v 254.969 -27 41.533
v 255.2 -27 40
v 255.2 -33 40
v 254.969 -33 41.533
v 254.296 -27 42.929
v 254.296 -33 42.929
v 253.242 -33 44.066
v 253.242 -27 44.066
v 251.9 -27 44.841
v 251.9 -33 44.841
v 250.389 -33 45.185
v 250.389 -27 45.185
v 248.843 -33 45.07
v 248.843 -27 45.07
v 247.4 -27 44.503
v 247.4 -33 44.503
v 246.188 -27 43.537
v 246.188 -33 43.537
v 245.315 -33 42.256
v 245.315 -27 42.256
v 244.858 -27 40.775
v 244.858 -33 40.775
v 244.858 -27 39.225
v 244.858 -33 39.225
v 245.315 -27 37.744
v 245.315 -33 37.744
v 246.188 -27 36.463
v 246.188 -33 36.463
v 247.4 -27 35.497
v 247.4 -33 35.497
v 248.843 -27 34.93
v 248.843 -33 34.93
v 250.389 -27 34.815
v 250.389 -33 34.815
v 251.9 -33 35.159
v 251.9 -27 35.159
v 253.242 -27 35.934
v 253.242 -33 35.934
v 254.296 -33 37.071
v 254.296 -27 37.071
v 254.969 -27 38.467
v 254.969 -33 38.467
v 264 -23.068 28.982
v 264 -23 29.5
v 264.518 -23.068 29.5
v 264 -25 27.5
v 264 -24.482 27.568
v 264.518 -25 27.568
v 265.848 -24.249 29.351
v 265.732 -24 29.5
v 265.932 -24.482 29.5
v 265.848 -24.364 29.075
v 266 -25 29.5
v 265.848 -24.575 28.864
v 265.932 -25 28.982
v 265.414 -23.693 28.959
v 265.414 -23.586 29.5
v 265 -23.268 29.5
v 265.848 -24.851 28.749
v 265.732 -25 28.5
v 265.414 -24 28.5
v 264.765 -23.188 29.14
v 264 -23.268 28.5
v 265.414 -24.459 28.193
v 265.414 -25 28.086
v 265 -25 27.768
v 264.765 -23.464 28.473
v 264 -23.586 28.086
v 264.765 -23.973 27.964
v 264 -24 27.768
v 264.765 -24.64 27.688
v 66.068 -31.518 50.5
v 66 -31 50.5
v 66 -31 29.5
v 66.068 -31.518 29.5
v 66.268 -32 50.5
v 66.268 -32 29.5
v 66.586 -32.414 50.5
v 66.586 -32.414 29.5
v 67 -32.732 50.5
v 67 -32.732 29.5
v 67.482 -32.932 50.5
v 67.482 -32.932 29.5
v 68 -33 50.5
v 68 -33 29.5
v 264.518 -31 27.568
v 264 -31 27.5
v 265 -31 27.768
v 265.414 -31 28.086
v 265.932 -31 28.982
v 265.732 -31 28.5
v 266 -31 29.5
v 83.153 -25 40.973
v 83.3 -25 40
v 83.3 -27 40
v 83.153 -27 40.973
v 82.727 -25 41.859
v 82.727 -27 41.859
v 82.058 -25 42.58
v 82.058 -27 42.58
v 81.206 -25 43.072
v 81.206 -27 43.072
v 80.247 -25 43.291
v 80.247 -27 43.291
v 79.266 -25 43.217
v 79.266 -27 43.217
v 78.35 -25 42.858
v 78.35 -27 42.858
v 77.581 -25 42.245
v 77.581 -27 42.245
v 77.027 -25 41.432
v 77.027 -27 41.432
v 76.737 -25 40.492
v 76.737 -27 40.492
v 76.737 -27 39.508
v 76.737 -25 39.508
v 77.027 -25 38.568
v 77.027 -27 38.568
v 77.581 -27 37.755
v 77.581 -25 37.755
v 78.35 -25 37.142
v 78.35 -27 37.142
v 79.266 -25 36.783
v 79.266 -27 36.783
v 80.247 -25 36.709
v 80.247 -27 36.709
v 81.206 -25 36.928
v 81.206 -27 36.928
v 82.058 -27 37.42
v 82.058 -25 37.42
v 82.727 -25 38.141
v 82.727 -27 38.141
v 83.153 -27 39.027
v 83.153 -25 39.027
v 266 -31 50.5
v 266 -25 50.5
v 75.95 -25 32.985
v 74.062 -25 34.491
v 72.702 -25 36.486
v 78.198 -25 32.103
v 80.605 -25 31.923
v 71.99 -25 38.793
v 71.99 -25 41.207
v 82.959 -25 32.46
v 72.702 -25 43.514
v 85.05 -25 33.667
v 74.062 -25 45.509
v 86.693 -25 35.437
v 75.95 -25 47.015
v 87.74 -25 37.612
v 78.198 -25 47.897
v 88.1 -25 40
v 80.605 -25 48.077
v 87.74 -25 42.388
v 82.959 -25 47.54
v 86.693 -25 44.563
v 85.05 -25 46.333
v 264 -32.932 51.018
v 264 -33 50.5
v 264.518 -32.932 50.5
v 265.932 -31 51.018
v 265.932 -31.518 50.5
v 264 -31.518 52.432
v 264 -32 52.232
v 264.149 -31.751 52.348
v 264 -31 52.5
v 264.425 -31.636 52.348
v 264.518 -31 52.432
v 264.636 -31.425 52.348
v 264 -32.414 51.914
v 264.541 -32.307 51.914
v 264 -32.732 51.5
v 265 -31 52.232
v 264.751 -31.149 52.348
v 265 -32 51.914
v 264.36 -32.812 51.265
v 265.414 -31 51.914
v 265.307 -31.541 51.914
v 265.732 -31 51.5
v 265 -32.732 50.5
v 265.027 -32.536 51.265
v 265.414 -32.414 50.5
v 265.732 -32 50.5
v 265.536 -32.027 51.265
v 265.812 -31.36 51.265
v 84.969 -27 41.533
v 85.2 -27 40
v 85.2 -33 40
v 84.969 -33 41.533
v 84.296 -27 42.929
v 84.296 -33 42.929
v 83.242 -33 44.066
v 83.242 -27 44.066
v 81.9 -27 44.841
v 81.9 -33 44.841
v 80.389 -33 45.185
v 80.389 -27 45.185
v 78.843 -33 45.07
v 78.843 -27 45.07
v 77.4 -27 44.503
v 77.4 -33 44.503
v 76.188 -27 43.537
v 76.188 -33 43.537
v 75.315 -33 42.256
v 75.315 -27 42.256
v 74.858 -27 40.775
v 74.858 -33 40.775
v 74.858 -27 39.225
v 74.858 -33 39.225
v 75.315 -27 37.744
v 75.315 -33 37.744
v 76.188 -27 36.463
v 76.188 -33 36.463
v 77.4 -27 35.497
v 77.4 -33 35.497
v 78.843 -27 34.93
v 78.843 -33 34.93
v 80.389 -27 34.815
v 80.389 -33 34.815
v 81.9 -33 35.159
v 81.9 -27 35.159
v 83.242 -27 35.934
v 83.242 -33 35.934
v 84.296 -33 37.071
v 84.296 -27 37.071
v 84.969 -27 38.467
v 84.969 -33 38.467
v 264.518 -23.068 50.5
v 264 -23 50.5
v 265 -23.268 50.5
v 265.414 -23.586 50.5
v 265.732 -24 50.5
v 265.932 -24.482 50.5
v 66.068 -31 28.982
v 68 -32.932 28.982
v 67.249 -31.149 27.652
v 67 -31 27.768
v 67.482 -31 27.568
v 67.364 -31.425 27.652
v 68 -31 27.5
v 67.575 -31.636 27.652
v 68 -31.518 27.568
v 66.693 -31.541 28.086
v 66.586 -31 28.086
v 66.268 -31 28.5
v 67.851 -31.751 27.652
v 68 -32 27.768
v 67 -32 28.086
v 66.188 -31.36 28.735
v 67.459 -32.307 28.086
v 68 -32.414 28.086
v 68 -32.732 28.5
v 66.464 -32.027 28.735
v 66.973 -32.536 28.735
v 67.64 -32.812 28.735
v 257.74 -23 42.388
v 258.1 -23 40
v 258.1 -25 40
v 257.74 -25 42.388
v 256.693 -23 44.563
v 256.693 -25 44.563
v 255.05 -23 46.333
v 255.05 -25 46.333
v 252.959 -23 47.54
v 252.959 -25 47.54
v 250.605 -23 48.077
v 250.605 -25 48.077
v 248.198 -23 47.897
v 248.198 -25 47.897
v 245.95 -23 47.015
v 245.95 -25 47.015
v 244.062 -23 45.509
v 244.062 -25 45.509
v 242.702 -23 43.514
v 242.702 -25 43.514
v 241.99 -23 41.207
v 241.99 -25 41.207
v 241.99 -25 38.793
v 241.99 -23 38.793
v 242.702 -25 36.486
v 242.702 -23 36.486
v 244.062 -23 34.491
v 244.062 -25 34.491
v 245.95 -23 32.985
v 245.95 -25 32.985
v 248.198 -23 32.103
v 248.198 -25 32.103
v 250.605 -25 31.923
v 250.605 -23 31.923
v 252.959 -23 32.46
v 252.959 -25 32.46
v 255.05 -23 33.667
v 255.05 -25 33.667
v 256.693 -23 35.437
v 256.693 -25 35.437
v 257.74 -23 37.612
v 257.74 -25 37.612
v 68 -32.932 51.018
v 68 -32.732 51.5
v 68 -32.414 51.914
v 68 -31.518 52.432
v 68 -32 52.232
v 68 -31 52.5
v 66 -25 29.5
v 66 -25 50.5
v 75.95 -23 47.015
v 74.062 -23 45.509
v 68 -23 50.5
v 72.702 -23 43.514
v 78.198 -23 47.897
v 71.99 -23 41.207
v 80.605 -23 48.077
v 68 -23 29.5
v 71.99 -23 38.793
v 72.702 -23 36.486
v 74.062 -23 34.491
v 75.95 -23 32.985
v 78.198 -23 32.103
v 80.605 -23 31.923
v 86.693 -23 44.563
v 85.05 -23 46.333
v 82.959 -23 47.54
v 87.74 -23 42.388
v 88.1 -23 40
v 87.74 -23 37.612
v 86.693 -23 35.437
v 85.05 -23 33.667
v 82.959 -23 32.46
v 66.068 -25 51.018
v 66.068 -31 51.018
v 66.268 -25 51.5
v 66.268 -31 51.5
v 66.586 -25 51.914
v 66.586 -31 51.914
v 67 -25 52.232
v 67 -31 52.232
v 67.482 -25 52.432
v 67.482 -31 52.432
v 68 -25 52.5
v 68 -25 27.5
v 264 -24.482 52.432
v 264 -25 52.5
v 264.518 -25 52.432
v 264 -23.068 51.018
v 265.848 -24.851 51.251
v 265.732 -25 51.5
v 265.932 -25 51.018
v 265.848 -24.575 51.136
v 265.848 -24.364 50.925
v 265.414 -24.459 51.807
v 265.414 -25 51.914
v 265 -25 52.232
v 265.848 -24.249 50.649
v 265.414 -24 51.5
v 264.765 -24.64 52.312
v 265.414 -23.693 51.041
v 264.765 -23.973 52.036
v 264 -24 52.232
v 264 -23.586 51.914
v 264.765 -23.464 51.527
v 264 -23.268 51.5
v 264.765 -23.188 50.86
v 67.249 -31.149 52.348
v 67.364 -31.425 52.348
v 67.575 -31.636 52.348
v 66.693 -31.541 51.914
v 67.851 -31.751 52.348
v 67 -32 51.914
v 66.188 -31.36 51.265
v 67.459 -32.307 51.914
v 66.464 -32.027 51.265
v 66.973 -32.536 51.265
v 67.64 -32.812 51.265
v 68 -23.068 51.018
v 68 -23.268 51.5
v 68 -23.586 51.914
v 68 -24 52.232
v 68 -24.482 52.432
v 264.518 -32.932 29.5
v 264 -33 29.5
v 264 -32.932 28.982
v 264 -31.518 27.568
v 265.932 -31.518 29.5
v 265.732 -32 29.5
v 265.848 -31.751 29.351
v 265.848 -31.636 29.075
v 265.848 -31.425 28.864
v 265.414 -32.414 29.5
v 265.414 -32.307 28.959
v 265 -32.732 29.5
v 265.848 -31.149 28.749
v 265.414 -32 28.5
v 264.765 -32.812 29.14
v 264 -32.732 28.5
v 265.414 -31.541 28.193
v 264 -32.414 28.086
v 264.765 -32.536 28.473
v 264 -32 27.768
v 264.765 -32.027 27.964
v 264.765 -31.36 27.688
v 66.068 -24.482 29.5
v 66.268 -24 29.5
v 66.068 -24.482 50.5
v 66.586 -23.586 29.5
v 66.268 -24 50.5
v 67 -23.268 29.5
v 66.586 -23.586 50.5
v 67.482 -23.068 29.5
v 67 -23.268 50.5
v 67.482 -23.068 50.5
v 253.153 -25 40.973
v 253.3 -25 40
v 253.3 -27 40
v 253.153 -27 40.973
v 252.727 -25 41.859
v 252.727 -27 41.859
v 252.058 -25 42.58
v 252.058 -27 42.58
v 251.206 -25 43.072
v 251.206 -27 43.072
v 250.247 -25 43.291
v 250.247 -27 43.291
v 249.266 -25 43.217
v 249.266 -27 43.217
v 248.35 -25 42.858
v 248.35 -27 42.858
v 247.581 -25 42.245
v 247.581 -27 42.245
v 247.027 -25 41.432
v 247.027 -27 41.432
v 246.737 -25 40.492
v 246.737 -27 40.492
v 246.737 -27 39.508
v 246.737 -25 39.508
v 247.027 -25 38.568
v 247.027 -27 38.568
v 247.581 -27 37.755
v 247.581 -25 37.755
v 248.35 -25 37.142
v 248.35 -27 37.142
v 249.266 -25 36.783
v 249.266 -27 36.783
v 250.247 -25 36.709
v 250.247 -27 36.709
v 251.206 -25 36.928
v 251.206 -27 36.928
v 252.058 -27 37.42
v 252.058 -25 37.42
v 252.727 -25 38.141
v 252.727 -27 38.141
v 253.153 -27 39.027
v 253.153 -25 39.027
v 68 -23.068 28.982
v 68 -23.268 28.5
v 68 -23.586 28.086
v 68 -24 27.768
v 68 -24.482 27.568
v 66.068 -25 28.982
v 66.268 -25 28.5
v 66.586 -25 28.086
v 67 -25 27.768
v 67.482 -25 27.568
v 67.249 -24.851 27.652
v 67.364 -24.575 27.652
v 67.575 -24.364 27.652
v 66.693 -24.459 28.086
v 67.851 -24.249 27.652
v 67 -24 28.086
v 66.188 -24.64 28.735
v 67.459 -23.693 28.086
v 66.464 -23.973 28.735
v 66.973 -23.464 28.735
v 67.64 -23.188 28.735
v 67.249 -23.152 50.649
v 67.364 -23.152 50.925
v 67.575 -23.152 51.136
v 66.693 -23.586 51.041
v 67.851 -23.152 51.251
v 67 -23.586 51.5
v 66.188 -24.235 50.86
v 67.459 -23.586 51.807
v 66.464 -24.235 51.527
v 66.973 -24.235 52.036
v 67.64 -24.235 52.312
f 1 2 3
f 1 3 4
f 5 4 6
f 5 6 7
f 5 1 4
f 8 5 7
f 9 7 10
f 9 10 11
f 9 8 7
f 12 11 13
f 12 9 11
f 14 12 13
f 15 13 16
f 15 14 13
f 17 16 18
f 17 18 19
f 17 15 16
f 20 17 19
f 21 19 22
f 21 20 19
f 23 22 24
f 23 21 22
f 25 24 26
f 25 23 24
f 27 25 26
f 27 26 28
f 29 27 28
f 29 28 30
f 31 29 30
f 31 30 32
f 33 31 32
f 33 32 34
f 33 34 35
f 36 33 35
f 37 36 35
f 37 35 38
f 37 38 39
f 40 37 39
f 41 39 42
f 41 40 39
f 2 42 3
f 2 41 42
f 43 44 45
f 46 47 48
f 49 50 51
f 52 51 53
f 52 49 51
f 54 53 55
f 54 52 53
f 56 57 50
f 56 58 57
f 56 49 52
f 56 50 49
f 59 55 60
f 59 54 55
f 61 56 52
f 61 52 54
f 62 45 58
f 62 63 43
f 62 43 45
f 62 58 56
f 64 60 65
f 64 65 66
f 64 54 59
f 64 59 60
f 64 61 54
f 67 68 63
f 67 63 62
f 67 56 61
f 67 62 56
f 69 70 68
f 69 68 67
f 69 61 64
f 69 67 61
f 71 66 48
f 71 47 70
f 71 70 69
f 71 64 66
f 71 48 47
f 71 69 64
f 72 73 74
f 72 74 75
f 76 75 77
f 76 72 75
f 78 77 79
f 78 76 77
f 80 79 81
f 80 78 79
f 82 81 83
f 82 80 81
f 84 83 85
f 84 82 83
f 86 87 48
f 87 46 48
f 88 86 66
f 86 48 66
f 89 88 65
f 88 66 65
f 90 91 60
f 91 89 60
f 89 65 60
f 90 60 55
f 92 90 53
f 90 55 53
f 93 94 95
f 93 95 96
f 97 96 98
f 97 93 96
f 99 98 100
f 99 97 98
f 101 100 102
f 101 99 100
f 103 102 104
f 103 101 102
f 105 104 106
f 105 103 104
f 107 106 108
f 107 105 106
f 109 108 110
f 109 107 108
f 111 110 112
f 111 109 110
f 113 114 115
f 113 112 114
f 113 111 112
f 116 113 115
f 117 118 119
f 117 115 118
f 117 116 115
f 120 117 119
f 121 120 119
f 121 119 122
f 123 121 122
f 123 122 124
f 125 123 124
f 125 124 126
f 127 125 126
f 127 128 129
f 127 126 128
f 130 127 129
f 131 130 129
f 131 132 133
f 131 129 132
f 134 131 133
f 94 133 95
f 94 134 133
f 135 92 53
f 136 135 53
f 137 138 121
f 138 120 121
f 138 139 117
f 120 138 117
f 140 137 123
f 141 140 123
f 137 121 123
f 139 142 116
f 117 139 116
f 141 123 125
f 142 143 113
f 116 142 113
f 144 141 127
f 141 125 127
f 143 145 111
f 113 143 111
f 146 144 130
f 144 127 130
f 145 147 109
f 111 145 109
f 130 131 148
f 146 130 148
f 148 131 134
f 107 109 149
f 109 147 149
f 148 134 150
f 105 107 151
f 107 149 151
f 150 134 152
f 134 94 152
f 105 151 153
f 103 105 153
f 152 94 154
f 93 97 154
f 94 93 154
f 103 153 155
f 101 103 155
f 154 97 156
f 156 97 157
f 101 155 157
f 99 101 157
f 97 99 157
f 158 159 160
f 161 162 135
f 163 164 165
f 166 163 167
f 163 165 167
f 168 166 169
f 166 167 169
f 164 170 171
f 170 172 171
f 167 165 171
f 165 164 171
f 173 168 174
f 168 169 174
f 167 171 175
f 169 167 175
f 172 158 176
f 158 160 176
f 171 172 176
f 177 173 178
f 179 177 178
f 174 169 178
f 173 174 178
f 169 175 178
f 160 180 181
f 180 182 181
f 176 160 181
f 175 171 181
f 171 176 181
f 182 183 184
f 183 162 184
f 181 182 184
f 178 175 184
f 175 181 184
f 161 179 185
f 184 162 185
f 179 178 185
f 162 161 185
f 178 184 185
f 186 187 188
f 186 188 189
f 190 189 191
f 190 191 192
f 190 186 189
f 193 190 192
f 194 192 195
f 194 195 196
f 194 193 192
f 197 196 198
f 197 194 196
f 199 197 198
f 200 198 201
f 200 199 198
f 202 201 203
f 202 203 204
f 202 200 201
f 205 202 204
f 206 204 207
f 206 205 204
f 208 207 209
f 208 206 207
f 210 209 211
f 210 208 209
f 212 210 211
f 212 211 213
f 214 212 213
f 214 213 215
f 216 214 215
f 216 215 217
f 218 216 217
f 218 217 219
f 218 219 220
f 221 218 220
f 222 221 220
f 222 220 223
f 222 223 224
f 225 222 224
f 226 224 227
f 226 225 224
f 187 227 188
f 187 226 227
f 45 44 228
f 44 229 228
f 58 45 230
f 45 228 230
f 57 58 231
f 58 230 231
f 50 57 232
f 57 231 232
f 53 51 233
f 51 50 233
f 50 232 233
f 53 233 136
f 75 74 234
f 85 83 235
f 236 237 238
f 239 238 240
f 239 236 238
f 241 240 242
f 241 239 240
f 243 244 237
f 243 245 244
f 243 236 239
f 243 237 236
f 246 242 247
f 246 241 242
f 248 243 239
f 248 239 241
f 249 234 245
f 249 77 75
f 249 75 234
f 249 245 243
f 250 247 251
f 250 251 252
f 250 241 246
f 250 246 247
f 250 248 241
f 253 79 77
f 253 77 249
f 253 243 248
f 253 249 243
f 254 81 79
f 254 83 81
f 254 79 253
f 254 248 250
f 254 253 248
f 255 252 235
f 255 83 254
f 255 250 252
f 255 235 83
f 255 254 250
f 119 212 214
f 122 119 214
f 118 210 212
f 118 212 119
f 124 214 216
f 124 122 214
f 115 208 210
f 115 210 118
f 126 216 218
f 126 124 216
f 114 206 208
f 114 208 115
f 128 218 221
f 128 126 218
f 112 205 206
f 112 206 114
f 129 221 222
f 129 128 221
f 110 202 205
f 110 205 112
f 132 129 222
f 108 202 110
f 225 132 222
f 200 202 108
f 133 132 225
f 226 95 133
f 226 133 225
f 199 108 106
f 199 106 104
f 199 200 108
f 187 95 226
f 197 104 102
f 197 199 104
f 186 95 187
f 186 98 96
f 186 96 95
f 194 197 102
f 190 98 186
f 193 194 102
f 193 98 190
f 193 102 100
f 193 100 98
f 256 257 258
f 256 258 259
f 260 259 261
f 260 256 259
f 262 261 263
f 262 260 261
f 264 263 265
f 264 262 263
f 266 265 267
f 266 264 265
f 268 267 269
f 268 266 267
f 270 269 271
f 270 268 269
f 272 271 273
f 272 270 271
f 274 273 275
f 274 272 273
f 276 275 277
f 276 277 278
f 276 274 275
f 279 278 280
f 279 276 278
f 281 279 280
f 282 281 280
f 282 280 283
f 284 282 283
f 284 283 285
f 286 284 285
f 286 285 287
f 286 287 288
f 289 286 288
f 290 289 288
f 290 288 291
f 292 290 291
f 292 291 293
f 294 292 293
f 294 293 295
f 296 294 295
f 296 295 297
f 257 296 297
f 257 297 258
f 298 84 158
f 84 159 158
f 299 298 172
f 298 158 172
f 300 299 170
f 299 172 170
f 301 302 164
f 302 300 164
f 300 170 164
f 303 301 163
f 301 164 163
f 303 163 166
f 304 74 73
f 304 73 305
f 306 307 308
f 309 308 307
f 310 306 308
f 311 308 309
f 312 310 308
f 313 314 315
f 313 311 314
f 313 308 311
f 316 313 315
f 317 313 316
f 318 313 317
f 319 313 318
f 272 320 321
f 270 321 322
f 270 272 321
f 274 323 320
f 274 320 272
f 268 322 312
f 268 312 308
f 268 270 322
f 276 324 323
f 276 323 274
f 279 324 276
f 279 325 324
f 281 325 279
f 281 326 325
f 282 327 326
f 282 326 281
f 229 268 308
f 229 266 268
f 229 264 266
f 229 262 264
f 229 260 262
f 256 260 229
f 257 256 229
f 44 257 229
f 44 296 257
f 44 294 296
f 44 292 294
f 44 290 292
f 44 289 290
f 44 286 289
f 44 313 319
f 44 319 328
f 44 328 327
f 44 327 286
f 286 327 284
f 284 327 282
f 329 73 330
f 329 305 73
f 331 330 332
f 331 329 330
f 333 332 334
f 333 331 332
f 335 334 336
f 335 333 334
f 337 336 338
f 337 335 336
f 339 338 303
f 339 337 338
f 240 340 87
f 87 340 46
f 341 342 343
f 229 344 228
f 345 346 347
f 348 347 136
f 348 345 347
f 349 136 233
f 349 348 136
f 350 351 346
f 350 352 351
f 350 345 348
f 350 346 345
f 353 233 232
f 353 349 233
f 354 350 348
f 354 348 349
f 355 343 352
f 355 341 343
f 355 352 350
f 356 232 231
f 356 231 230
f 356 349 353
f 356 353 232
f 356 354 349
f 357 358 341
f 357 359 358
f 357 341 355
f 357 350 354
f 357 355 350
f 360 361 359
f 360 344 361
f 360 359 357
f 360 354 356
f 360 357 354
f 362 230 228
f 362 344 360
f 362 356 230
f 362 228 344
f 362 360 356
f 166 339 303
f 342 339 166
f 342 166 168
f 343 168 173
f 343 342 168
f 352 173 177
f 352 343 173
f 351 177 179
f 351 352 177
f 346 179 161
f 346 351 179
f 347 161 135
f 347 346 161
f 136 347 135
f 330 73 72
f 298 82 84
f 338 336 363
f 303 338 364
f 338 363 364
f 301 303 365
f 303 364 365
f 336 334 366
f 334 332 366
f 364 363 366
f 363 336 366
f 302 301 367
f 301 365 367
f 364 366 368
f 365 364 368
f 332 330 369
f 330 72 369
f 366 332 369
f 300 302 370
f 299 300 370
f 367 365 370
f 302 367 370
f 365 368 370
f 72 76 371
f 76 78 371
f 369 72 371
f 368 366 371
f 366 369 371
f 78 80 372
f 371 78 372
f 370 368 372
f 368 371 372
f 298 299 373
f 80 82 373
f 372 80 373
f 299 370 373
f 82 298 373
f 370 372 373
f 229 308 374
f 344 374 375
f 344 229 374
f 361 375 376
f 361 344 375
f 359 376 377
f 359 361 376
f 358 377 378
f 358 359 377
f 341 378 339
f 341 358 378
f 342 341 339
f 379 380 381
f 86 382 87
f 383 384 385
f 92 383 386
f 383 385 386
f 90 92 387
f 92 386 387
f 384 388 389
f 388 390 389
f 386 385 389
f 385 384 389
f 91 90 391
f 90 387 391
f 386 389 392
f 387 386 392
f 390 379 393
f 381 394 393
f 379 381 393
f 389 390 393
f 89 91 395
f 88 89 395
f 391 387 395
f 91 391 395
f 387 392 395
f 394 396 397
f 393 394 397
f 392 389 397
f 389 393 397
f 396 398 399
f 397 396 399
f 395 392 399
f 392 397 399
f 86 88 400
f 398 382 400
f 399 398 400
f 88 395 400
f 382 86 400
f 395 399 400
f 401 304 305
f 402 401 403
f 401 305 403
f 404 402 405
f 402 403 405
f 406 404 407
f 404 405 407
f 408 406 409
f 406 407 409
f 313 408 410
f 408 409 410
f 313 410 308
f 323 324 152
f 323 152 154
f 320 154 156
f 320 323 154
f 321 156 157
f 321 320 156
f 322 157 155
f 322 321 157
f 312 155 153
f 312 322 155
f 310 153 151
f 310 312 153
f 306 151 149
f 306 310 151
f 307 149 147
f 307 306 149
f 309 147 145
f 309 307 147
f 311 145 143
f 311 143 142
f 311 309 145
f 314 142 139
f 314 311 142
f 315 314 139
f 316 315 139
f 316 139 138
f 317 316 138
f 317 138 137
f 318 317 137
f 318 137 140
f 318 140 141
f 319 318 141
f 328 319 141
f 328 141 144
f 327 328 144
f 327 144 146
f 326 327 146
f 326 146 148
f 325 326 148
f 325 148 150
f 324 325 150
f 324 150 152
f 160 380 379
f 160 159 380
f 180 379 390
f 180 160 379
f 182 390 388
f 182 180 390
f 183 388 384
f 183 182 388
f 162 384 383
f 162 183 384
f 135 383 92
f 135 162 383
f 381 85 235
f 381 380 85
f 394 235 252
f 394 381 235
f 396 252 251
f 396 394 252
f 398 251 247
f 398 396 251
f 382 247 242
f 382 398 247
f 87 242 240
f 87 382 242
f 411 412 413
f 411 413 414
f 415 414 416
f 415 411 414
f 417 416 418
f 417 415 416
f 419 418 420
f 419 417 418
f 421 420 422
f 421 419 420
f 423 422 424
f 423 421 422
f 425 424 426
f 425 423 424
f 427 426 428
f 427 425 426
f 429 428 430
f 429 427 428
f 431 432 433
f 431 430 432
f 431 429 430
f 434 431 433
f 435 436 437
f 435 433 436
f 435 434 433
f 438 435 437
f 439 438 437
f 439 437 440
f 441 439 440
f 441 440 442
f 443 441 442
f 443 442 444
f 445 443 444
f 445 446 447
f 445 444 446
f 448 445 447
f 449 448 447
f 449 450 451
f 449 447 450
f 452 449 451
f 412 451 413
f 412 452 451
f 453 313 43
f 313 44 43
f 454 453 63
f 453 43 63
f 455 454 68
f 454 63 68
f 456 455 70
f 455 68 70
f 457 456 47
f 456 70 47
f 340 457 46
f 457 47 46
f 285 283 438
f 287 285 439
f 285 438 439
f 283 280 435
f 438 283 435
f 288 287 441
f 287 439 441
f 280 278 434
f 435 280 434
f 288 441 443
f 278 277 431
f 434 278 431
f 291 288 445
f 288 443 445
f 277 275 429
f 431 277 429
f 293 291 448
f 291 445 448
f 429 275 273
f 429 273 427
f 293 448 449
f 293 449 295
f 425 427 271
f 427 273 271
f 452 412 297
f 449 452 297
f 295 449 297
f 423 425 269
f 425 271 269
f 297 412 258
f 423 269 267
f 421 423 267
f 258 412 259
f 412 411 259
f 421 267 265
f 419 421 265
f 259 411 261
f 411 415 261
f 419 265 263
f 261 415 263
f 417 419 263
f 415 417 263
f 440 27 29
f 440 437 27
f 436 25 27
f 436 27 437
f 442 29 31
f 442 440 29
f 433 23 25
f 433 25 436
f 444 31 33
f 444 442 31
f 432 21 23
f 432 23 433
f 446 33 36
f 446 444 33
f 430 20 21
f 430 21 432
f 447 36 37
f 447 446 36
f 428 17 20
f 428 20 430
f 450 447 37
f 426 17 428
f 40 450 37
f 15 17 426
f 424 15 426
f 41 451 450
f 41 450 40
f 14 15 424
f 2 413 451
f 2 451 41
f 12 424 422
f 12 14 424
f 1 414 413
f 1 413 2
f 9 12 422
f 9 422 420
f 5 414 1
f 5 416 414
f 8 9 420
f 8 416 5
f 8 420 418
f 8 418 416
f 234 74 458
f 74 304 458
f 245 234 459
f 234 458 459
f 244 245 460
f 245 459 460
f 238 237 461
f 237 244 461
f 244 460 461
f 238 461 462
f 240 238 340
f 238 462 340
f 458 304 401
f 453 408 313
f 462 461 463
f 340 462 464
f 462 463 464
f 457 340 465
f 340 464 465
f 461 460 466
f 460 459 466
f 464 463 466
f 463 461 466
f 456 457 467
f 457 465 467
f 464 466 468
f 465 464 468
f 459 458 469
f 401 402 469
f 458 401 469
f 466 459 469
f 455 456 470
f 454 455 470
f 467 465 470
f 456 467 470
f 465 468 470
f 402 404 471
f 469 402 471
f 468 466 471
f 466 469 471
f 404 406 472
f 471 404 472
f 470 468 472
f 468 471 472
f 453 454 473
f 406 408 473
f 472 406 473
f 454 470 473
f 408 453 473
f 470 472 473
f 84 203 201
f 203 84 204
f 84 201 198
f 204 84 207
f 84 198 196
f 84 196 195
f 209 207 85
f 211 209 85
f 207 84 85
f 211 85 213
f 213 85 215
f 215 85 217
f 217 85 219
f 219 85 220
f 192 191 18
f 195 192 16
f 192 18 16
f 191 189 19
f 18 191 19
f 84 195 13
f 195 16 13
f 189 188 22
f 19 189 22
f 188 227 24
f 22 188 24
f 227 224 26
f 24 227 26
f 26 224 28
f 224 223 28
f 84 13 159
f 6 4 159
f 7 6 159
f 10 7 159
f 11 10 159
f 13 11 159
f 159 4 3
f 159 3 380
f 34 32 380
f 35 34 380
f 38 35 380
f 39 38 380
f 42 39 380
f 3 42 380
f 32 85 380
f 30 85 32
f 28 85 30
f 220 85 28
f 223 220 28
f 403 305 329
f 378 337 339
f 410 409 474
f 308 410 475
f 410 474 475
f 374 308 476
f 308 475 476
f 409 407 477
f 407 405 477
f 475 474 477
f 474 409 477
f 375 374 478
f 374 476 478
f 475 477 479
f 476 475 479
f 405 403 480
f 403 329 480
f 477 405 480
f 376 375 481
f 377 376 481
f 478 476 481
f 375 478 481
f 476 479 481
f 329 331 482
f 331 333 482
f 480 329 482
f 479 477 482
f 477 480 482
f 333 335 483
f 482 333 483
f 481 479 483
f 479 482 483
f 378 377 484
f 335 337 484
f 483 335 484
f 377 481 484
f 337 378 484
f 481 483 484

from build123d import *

# Parameters (mm, degrees)
CYLINDER051_R     = 5.2
CYLINDER051_DEPTH = 6
CYLINDER052_R     = 3.3
CYLINDER052_DEPTH = 20
CYLINDER053_R     = 3.3
CYLINDER053_DEPTH = 20
CYLINDER050_R     = 5.2
CYLINDER050_DEPTH = 6
CYLINDER049_R     = 8.1
CYLINDER049_DEPTH = 20
CYLINDER048_R     = 8.1
CYLINDER048_DEPTH = 20
BOX002_W          = 200
BOX002_H          = 10
BOX002_DEPTH      = 25
FILLET_R          = 2


with BuildPart() as zylinder051:
    # Cylinder051 → Cylinder051 (new body)
    with BuildSketch(Plane(origin=(250, -22, 40), x_dir=(1, 0, 0), z_dir=(0, -1, 0))):
        Circle(CYLINDER051_R)
    extrude(amount=CYLINDER051_DEPTH)


with BuildPart() as zylinder052:
    # Cylinder052 → Cylinder052 (new body)
    with BuildSketch(Plane(origin=(80, -10, 40), x_dir=(1, 0, 0), z_dir=(0, -1, 0))):
        Circle(CYLINDER052_R)
    extrude(amount=CYLINDER052_DEPTH)


with BuildPart() as zylinder053:
    # Cylinder053 → Cylinder053 (new body)
    with BuildSketch(Plane(origin=(250, -10, 40), x_dir=(1, 0, 0), z_dir=(0, -1, 0))):
        Circle(CYLINDER053_R)
    extrude(amount=CYLINDER053_DEPTH)


with BuildPart() as fusion009:
    # Cylinder050 → Cylinder050 (new body)
    with BuildSketch(Plane(origin=(80, -22, 40), x_dir=(1, 0, 0), z_dir=(0, -1, 0))):
        Circle(CYLINDER050_R)
    extrude(amount=CYLINDER050_DEPTH)

    # Fusion009: union Zylinder051, Zylinder052, Zylinder053
    add(zylinder051.part)
    add(zylinder052.part)
    add(zylinder053.part)


with BuildPart() as zylinder049:
    # Cylinder049 → Cylinder049 (new body)
    with BuildSketch(Plane(origin=(250, 0, 40), x_dir=(1, 0, 0), z_dir=(0, -1, 0))):
        Circle(CYLINDER049_R)
    extrude(amount=CYLINDER049_DEPTH)


with BuildPart() as zylinder048:
    # Cylinder048 → Cylinder048 (new body)
    with BuildSketch(Plane(origin=(80, 0, 40), x_dir=(1, 0, 0), z_dir=(0, -1, 0))):
        Circle(CYLINDER048_R)
    extrude(amount=CYLINDER048_DEPTH)


with BuildPart() as handlewithfillet:
    # Box002 → Box002 (new body)
    with BuildSketch(Plane(origin=(66, -28, 27.5), x_dir=(1, 0, 0), z_dir=(0, 0, 1))):
        with Locations((100, 5)):
            Rectangle(BOX002_W, BOX002_H)
    extrude(amount=BOX002_DEPTH)

    # Cut008: cut Zylinder048
    add(zylinder048.part, mode=Mode.SUBTRACT)

    # Cut009: cut Zylinder049
    add(zylinder049.part, mode=Mode.SUBTRACT)

    # Cut010: cut Fusion009
    add(fusion009.part, mode=Mode.SUBTRACT)

    # Fillet
    fillet_edges = [handlewithfillet.edges().sort_by_distance(p)[0] for p in [
        (66, -28, 40),
        (66, -23, 52.5),
        (66, -18, 40),
        (66, -23, 27.5),
        (166, -28, 27.5),
        (266, -28, 40),
        (166, -28, 52.5),
        (166, -18, 52.5),
        (266, -23, 52.5),
        (166, -18, 27.5),
        (266, -18, 40),
        (266, -23, 27.5),
    ]]
    fillet(fillet_edges, radius=FILLET_R)


with BuildPart() as handlewithfillet_1:
    # Fillet placement: moved
    add(handlewithfillet.part.moved(Location((0, -5, 0))))


solid = handlewithfillet_1.part
